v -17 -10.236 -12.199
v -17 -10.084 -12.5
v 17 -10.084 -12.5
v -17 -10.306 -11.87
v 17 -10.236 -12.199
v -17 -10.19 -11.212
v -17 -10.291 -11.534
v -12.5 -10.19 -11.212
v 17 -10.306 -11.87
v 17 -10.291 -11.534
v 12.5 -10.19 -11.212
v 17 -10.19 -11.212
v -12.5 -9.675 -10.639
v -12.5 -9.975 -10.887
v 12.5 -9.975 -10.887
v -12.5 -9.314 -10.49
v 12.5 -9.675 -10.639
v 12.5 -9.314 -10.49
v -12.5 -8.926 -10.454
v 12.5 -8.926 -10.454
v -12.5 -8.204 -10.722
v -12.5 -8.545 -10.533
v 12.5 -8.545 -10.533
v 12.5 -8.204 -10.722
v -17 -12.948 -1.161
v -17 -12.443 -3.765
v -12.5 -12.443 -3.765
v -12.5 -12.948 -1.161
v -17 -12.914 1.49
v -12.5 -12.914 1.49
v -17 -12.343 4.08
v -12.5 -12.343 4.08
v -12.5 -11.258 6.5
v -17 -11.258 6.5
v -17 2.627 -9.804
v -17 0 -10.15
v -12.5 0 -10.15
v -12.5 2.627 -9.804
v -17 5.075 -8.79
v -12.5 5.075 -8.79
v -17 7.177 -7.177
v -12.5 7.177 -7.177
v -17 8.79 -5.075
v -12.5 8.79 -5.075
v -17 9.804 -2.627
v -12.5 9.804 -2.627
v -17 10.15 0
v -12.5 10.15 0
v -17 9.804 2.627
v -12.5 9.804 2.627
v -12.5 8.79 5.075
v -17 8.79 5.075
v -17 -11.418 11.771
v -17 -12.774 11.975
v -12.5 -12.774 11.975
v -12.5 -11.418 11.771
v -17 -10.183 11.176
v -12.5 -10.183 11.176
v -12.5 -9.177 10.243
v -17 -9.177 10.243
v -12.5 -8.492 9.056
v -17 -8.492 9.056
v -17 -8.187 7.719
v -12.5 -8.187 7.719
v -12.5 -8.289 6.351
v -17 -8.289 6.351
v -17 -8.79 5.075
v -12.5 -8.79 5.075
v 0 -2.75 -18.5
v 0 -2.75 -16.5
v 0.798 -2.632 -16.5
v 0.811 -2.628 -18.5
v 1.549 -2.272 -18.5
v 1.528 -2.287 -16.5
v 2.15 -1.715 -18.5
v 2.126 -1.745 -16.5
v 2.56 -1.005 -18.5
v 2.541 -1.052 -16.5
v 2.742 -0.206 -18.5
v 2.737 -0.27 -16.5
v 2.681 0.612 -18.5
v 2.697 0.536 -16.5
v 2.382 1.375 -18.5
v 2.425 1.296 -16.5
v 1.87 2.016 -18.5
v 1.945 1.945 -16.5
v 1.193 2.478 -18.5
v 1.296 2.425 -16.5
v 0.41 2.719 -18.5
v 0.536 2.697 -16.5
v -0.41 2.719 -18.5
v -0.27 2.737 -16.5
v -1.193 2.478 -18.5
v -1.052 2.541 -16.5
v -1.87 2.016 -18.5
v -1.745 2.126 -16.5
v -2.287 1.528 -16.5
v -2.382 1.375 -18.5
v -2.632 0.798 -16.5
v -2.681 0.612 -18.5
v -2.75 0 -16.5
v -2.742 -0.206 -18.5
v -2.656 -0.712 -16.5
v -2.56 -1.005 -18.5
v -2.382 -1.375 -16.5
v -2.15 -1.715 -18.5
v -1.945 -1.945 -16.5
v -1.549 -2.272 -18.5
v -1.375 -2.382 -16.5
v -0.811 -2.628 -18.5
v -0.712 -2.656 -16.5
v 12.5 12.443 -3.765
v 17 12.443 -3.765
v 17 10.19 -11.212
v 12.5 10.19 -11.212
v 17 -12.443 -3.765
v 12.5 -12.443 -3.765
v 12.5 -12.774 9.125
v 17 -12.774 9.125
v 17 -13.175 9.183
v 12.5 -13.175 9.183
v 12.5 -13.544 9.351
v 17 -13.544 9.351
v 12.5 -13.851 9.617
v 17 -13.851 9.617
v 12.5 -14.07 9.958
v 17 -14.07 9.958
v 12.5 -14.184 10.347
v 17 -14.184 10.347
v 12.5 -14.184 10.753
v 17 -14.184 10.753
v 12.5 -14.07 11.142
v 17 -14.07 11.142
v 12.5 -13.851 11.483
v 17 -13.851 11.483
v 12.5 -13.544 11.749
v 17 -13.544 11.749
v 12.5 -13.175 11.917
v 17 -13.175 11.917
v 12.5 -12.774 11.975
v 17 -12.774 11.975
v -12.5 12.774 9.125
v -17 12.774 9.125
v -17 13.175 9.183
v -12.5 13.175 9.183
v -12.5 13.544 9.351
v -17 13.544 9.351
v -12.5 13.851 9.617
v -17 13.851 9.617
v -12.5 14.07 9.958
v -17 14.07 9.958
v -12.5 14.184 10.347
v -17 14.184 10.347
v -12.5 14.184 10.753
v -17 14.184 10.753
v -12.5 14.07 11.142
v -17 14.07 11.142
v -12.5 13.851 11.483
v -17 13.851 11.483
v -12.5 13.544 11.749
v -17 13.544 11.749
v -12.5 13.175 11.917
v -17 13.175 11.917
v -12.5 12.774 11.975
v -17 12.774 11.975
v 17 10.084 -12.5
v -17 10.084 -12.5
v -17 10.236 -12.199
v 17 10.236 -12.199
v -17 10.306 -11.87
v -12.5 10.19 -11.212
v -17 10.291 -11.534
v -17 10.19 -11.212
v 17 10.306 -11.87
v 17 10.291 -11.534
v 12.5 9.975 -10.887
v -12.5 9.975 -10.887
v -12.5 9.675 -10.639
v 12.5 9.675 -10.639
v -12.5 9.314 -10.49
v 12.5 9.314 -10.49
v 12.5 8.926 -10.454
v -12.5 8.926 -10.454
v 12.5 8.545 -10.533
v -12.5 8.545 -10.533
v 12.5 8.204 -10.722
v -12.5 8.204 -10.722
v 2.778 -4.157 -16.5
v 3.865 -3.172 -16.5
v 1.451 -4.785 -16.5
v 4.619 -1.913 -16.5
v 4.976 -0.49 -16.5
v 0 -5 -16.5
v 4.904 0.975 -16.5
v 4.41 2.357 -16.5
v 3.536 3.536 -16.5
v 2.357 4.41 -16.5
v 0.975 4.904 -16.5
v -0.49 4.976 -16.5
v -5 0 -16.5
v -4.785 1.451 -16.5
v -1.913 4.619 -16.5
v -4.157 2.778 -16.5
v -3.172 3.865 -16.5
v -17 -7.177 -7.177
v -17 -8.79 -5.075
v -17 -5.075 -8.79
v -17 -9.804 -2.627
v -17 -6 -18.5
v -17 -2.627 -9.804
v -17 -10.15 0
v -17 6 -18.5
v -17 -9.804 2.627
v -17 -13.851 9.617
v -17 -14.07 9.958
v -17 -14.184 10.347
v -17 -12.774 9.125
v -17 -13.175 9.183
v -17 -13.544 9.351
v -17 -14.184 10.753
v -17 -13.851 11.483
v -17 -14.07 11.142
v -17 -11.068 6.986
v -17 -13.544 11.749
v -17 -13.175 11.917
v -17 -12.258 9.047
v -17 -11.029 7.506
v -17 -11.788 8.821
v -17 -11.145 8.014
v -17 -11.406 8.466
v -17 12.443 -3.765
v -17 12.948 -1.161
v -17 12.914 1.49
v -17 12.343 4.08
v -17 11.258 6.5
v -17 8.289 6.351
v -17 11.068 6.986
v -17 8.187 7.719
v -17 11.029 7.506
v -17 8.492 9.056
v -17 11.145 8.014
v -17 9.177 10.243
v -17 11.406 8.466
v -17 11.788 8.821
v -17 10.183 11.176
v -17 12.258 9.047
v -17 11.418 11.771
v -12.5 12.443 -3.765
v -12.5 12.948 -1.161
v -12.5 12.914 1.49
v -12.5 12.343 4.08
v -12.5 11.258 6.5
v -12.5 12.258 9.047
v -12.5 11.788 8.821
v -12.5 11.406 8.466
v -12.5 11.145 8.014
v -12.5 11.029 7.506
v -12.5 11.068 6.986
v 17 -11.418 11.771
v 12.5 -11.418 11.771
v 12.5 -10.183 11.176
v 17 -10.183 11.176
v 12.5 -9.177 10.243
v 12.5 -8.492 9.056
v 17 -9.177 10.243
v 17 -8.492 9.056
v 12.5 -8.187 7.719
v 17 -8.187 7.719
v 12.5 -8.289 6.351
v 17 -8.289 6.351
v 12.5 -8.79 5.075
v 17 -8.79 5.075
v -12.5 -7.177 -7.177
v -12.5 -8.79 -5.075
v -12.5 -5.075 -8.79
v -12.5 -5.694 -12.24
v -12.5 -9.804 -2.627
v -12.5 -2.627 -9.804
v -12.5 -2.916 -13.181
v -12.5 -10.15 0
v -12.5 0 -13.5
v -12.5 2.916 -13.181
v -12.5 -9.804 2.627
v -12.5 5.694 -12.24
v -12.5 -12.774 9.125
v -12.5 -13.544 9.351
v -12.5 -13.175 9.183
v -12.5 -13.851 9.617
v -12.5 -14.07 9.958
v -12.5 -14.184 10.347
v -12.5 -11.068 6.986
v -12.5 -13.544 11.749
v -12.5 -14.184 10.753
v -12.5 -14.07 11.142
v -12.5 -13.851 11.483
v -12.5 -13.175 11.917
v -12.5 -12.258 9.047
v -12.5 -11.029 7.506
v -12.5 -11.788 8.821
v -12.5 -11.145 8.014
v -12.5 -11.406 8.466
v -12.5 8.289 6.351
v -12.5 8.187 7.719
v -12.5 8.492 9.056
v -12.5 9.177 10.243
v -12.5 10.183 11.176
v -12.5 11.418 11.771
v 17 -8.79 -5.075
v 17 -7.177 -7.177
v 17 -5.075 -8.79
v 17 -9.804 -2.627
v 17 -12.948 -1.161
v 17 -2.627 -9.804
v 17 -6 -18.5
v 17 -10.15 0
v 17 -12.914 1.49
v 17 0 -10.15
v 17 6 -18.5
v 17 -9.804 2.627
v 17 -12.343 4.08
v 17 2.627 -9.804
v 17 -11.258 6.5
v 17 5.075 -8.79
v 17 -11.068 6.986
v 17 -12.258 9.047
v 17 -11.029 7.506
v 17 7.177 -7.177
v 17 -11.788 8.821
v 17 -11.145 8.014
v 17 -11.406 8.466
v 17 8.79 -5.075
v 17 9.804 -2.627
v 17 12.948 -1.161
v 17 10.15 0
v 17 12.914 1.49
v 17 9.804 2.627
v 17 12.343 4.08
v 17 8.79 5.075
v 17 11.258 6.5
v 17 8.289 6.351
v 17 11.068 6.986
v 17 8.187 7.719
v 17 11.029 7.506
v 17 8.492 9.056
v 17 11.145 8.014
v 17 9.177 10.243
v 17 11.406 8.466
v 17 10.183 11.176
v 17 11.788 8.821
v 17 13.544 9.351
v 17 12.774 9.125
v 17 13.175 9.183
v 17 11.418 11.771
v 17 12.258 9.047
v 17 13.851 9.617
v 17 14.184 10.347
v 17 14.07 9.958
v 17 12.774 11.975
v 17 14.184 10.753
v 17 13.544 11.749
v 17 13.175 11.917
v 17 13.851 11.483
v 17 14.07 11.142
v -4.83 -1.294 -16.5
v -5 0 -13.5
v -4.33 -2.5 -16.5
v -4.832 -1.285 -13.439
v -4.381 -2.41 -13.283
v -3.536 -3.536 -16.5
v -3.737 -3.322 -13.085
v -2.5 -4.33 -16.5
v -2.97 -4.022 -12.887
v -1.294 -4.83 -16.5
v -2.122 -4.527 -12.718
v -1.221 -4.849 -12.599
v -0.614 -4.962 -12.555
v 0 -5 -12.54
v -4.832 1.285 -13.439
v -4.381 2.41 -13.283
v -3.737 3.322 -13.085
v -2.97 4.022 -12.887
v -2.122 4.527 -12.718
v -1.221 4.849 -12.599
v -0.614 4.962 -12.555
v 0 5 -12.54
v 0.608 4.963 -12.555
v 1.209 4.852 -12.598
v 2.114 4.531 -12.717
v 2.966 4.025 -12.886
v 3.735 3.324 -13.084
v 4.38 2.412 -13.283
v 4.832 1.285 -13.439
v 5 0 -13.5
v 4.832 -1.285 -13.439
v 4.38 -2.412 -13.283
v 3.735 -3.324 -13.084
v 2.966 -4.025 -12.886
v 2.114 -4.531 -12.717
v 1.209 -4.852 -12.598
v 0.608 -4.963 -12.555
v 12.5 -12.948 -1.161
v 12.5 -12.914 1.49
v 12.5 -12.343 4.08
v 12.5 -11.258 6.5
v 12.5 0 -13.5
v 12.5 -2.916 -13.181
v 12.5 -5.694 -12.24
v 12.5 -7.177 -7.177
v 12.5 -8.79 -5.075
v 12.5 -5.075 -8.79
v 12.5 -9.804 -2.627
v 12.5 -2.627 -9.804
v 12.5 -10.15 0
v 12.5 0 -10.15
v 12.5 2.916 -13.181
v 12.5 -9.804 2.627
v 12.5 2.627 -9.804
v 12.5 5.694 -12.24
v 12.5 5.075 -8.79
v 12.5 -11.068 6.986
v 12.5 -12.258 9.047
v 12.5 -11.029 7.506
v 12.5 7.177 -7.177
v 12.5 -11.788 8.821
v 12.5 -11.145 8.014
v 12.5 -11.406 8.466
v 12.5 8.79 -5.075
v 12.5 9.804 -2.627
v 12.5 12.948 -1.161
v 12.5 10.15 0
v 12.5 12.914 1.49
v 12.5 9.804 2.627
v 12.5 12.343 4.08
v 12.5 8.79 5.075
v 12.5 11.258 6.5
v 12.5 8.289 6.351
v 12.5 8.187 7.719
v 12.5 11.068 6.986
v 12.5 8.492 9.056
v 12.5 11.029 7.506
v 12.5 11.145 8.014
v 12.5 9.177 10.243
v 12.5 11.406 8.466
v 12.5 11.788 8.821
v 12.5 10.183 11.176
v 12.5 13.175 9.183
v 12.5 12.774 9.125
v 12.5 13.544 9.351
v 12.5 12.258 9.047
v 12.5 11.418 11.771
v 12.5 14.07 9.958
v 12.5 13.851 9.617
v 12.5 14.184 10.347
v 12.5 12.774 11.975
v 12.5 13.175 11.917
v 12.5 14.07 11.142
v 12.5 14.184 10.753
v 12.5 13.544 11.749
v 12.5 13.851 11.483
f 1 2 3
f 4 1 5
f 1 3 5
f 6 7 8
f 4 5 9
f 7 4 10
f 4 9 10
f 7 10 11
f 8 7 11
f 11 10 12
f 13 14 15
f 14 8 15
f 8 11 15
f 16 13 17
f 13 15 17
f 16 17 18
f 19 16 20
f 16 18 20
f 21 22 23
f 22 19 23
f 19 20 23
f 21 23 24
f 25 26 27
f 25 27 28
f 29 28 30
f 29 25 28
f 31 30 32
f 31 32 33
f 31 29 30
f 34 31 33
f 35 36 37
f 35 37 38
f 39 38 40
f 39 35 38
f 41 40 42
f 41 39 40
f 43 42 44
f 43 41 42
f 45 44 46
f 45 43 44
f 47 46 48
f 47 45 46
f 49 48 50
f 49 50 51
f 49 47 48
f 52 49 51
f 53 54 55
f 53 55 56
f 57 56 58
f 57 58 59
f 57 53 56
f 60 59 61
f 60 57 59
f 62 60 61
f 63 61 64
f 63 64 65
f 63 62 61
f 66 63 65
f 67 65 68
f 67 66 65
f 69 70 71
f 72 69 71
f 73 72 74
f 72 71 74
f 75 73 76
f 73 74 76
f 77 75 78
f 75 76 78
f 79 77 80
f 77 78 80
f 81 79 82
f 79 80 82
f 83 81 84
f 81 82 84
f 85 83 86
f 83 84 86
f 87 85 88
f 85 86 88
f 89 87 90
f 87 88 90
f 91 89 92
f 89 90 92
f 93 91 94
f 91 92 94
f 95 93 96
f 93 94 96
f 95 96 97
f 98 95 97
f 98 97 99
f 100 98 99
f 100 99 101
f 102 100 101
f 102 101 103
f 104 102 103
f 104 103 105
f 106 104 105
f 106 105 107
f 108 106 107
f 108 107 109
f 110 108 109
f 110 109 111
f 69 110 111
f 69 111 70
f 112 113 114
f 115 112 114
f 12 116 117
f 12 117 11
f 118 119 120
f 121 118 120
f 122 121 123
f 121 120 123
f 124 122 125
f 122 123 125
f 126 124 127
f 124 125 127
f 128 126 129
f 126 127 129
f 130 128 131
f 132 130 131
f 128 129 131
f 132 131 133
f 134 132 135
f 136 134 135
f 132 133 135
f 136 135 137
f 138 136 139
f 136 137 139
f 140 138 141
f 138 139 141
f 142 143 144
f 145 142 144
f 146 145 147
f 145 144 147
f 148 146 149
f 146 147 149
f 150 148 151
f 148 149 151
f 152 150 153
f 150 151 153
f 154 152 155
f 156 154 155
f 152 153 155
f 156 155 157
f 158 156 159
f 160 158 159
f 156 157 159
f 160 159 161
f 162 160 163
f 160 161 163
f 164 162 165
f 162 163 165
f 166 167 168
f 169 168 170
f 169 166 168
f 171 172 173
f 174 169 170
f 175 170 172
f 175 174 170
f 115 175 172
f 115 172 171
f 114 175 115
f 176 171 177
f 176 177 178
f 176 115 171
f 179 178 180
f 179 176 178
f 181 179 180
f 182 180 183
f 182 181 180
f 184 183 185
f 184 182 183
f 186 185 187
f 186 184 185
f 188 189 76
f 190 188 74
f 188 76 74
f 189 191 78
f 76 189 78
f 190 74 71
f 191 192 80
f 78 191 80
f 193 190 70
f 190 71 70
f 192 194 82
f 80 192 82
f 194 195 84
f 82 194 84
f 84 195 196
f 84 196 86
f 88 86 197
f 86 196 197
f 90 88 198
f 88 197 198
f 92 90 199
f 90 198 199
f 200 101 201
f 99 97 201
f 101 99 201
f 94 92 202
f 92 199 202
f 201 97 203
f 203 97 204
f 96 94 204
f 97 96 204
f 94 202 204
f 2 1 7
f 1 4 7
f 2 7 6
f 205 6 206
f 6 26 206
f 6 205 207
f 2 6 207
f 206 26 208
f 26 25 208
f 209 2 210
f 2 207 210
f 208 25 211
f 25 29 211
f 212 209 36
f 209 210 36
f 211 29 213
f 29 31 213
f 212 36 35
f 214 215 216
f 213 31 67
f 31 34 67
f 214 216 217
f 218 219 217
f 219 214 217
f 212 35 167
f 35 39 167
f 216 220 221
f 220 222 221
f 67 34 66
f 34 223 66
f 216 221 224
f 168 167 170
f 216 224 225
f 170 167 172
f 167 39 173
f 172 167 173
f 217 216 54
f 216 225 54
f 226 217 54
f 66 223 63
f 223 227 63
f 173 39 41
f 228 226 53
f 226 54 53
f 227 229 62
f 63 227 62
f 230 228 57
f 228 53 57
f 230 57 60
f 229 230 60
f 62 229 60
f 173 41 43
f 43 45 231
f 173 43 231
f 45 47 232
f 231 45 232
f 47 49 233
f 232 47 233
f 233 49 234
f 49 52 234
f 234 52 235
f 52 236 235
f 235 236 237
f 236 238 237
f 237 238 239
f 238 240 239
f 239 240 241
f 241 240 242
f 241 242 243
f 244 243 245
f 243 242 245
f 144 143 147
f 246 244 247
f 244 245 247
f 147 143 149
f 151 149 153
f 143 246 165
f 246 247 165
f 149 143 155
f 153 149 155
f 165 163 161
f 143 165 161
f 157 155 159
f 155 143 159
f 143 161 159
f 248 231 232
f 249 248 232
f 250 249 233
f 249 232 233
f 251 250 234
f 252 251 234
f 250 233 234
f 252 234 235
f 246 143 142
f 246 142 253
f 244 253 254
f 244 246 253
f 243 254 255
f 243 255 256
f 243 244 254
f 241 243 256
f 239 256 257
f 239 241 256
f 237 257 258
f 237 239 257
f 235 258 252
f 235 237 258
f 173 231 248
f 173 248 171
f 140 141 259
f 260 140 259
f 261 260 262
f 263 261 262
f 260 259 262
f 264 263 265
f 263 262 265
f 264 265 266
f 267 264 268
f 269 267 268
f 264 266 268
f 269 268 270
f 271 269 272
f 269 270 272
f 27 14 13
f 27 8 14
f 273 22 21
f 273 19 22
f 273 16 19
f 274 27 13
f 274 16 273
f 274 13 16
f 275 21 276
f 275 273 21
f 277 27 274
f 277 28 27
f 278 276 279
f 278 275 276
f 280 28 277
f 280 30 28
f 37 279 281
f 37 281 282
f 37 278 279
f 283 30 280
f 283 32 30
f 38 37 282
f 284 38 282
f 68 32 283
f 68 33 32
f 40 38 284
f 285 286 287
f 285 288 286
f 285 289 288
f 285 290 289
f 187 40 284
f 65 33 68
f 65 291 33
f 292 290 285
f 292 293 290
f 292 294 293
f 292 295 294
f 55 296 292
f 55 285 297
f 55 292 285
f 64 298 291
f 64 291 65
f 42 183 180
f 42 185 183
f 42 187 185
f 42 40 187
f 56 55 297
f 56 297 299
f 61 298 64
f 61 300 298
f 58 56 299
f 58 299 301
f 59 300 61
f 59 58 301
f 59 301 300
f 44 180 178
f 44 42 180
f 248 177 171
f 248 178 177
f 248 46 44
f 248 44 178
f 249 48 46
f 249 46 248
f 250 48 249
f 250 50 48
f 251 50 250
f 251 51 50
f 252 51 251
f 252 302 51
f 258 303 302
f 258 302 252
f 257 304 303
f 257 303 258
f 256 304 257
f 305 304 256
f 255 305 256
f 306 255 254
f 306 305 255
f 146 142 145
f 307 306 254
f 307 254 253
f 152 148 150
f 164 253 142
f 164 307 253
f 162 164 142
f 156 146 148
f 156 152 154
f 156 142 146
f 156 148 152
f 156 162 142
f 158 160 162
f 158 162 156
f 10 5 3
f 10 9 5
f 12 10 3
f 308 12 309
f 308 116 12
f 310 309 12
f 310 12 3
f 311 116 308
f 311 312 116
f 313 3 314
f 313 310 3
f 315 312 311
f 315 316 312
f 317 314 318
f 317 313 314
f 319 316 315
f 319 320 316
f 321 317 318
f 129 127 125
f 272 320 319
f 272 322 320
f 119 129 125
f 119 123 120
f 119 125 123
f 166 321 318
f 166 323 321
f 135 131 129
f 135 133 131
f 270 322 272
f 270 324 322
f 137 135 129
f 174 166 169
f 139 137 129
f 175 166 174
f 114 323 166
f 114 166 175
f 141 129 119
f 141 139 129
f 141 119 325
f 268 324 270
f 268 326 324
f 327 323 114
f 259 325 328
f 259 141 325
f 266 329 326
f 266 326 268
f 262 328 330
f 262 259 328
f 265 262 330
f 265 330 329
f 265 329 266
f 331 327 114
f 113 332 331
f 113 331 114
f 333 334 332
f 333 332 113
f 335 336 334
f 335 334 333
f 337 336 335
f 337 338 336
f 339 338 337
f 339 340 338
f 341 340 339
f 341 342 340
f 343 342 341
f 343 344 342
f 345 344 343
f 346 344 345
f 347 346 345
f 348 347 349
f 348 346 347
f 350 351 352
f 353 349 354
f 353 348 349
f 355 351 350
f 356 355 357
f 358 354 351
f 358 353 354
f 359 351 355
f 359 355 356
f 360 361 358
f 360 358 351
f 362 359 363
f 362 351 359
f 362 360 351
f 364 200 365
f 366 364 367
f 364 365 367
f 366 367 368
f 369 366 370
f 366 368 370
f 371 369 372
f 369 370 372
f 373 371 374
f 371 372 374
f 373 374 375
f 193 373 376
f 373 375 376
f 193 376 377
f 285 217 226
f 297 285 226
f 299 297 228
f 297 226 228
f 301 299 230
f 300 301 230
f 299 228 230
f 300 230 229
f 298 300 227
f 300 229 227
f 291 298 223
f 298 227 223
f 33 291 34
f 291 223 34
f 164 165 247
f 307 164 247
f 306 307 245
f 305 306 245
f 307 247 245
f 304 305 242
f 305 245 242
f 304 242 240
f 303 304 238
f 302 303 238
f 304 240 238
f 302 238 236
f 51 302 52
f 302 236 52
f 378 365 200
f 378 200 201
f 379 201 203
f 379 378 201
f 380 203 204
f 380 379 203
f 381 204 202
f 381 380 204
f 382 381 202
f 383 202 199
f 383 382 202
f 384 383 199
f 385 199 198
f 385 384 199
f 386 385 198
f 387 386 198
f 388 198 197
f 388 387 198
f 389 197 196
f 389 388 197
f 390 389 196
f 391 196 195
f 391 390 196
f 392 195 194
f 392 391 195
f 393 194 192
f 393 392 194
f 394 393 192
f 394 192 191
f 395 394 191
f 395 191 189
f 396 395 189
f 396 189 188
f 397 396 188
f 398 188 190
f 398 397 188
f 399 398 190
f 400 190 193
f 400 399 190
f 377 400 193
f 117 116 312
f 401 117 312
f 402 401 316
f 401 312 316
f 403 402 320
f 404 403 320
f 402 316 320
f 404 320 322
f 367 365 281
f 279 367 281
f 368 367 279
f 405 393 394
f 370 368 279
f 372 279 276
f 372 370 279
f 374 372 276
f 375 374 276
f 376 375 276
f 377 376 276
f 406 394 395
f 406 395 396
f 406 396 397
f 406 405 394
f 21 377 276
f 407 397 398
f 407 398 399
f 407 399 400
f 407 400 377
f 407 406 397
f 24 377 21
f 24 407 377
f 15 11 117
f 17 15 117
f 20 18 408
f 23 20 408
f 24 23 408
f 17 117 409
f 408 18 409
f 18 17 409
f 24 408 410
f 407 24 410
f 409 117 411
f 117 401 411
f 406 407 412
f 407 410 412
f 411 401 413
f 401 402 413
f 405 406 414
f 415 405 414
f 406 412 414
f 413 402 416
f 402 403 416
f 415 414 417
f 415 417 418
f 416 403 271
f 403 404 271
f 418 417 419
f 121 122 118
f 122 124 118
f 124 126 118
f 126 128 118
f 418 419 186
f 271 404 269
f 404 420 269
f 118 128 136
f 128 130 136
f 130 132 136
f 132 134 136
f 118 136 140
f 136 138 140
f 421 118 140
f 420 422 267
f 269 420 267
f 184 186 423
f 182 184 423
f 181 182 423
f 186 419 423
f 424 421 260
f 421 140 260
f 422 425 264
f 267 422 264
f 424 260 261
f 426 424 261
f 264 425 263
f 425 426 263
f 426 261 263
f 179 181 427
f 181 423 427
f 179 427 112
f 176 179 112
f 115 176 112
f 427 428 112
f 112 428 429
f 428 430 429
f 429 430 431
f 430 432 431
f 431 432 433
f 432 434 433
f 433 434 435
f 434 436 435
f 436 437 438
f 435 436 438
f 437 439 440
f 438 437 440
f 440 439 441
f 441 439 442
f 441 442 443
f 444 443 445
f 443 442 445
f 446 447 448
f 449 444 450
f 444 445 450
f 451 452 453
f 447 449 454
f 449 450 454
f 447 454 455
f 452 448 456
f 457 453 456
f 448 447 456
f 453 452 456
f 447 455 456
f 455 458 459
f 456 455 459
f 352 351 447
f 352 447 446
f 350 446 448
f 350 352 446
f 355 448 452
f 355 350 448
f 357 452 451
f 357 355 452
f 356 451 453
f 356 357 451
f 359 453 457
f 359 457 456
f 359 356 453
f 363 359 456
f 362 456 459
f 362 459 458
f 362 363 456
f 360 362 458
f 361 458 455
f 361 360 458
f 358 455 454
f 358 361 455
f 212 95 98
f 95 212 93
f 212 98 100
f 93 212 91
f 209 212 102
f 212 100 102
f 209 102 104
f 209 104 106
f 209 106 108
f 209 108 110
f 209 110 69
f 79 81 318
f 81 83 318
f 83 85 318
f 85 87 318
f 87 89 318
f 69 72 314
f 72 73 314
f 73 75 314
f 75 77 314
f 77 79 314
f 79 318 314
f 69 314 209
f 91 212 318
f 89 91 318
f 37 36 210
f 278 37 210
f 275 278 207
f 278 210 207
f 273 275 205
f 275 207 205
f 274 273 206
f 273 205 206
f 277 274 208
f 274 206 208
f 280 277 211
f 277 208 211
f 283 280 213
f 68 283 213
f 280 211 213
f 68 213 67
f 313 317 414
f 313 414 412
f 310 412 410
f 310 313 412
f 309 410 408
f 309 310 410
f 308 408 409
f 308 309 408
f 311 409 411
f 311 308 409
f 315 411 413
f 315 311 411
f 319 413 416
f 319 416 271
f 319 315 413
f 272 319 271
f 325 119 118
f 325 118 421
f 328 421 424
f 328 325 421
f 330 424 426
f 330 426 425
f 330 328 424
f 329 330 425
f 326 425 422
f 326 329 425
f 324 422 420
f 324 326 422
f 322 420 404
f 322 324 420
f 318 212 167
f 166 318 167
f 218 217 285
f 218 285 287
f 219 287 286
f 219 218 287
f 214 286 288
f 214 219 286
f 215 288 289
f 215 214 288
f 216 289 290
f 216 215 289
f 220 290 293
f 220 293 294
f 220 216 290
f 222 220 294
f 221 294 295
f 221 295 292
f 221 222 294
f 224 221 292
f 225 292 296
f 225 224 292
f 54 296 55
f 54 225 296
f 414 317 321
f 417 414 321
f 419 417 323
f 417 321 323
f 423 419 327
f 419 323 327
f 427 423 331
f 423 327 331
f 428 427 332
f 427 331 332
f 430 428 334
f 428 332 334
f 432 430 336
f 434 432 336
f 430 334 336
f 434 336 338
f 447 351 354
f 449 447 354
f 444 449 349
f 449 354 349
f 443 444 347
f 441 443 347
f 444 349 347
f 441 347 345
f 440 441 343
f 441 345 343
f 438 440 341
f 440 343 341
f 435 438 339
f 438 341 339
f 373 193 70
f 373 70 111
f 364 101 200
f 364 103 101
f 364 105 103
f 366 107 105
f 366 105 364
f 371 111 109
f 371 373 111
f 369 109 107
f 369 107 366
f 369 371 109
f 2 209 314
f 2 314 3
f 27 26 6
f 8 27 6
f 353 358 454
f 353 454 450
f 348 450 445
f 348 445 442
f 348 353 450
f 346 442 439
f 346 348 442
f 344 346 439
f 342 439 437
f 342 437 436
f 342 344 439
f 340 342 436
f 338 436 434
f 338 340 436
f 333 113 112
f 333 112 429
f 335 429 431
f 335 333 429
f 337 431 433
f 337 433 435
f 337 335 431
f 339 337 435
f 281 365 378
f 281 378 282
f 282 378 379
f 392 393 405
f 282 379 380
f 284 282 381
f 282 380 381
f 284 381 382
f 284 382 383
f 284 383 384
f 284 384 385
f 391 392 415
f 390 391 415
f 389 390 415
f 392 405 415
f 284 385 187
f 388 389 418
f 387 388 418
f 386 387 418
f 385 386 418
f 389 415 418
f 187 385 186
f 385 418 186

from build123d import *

# Parameters (mm, degrees)
PAD005_DEPTH                  = 17
PAD006_DEPTH                  = 4.5
SKETCH015_R                   = 2.75
POCKET005_DEPTH               = 93.84909
SKETCH016_R                   = 5
POCKET006_DEPTH               = 16.5
PAD005_MIRRORED002_2_DEPTH    = 17
PAD006_MIRRORED002_2_DEPTH    = 4.5
SKETCH015_MIRRORED002_2_R     = 2.75
POCKET005_MIRRORED002_2_DEPTH = 93.84909
SKETCH016_MIRRORED002_2_R     = 5
POCKET006_MIRRORED002_2_DEPTH = 16.5
SKETCH023_W                   = 1
SKETCH023_H                   = 10
POCKET011_DEPTH               = 0.2


with BuildPart() as part:
    # Sketch013 → Pad005 (new body)
    with BuildSketch(Plane.YZ):
        with BuildLine():
            ThreePointArc((0, -13.5), (4.330629, -12.786542), (8.203522, -10.721578))
            ThreePointArc((10.083563, -12.5), (9.900722, -10.810344), (8.203522, -10.721578))
            Line((6, -18.5), (10.083563, -12.5))
            Line((0, -18.5), (6, -18.5))
            Line((0, -13.5), (0, -18.5))
        make_face()
    pad005 = extrude(amount=PAD005_DEPTH)

    # Sketch014 → Pad006 (join)
    with BuildSketch(Plane.YZ.offset(17)):
        with BuildLine():
            ThreePointArc((0, -10.15), (8.790158, -5.075), (8.790158, 5.075))
            ThreePointArc((12.773875, 11.975), (8.790158, 9.675), (8.790158, 5.075))
            ThreePointArc((12.773875, 9.125), (14.198875, 10.55), (12.773875, 11.975))
            ThreePointArc((12.773875, 9.125), (11.25833, 8.25), (11.25833, 6.5))
            ThreePointArc((12.442941, -3.764734), (12.914285, 1.490384), (11.25833, 6.5))
            Line((12.442941, -3.764734), (9.8, -12.5))
            Line((9.8, -12.5), (0, -14.15))
            Line((0, -10.15), (0, -14.15))
        make_face()
    pad006 = extrude(amount=-PAD006_DEPTH)

    # Sketch015 → Pocket005 (cut, through all)
    with BuildSketch(Plane.XY):
        Circle(SKETCH015_R)
    pocket005 = extrude(amount=-POCKET005_DEPTH, mode=Mode.SUBTRACT)

    # Sketch016 → Pocket006 (cut)
    with BuildSketch(Plane.XY):
        Circle(SKETCH016_R)
    pocket006 = extrude(amount=-POCKET006_DEPTH, mode=Mode.SUBTRACT)

    # Sketch013 Mirrored002 2 → Pad005 Mirrored002 2 (add)
    with BuildSketch(Plane(origin=(0, 0, 0), x_dir=(0, -1, 0), z_dir=(-1, 0, 0))):
        with BuildLine():
            ThreePointArc((0, -13.5), (4.330629, -12.786542), (8.203522, -10.721578))
            ThreePointArc((10.083563, -12.5), (9.900722, -10.810344), (8.203522, -10.721578))
            Line((6, -18.5), (10.083563, -12.5))
            Line((0, -18.5), (6, -18.5))
            Line((0, -13.5), (0, -18.5))
        make_face()
    pad005_mirrored002_2 = extrude(amount=-PAD005_MIRRORED002_2_DEPTH)

    # Sketch014 Mirrored002 2 → Pad006 Mirrored002 2 (add)
    with BuildSketch(Plane(origin=(17, 0, 0), x_dir=(0, -1, 0), z_dir=(-1, 0, 0))):
        with BuildLine():
            ThreePointArc((0, -10.15), (8.790158, -5.075), (8.790158, 5.075))
            ThreePointArc((12.773875, 11.975), (8.790158, 9.675), (8.790158, 5.075))
            ThreePointArc((12.773875, 9.125), (14.198875, 10.55), (12.773875, 11.975))
            ThreePointArc((12.773875, 9.125), (11.25833, 8.25), (11.25833, 6.5))
            ThreePointArc((12.442941, -3.764734), (12.914285, 1.490384), (11.25833, 6.5))
            Line((12.442941, -3.764734), (9.8, -12.5))
            Line((9.8, -12.5), (0, -14.15))
            Line((0, -10.15), (0, -14.15))
        make_face()
    pad006_mirrored002_2 = extrude(amount=PAD006_MIRRORED002_2_DEPTH)

    # Sketch015 Mirrored002 2 → Pocket005 Mirrored002 2 (cut, through all)
    with BuildSketch(Plane(origin=(0, 0, 0), x_dir=(1, 0, 0), z_dir=(0, 0, -1))):
        Circle(SKETCH015_MIRRORED002_2_R)
    pocket005_mirrored002_2 = extrude(amount=POCKET005_MIRRORED002_2_DEPTH, mode=Mode.SUBTRACT)

    # Sketch016 Mirrored002 2 → Pocket006 Mirrored002 2 (cut)
    with BuildSketch(Plane(origin=(0, 0, 0), x_dir=(1, 0, 0), z_dir=(0, 0, -1))):
        Circle(SKETCH016_MIRRORED002_2_R)
    pocket006_mirrored002_2 = extrude(amount=POCKET006_MIRRORED002_2_DEPTH, mode=Mode.SUBTRACT)

    # Mirrored003: Pad005, Pad006, Pocket005, Pocket006, Pad005 Mirrored002 2, Pad006 Mirrored002 2, Pocket005 Mirrored002 2, Pocket006 Mirrored002 2 across YZ
    add(pad005.mirror(Plane.YZ))
    add(pad006.mirror(Plane.YZ))
    add(pocket005.mirror(Plane.YZ), mode=Mode.SUBTRACT)
    add(pocket006.mirror(Plane.YZ), mode=Mode.SUBTRACT)
    add(pad005_mirrored002_2.mirror(Plane.YZ))
    add(pad006_mirrored002_2.mirror(Plane.YZ))
    add(pocket005_mirrored002_2.mirror(Plane.YZ), mode=Mode.SUBTRACT)
    add(pocket006_mirrored002_2.mirror(Plane.YZ), mode=Mode.SUBTRACT)

    # Sketch023 → Pocket011 (cut)
    with BuildSketch(Plane.YZ.offset(29)):
        with Locations((0, -15)):
            Rectangle(SKETCH023_W, SKETCH023_H)
    pocket011 = extrude(amount=-POCKET011_DEPTH, mode=Mode.SUBTRACT)

    # Mirrored006: Pocket011 across YZ
    add(pocket011.mirror(Plane.YZ), mode=Mode.SUBTRACT)


solid = part.part
